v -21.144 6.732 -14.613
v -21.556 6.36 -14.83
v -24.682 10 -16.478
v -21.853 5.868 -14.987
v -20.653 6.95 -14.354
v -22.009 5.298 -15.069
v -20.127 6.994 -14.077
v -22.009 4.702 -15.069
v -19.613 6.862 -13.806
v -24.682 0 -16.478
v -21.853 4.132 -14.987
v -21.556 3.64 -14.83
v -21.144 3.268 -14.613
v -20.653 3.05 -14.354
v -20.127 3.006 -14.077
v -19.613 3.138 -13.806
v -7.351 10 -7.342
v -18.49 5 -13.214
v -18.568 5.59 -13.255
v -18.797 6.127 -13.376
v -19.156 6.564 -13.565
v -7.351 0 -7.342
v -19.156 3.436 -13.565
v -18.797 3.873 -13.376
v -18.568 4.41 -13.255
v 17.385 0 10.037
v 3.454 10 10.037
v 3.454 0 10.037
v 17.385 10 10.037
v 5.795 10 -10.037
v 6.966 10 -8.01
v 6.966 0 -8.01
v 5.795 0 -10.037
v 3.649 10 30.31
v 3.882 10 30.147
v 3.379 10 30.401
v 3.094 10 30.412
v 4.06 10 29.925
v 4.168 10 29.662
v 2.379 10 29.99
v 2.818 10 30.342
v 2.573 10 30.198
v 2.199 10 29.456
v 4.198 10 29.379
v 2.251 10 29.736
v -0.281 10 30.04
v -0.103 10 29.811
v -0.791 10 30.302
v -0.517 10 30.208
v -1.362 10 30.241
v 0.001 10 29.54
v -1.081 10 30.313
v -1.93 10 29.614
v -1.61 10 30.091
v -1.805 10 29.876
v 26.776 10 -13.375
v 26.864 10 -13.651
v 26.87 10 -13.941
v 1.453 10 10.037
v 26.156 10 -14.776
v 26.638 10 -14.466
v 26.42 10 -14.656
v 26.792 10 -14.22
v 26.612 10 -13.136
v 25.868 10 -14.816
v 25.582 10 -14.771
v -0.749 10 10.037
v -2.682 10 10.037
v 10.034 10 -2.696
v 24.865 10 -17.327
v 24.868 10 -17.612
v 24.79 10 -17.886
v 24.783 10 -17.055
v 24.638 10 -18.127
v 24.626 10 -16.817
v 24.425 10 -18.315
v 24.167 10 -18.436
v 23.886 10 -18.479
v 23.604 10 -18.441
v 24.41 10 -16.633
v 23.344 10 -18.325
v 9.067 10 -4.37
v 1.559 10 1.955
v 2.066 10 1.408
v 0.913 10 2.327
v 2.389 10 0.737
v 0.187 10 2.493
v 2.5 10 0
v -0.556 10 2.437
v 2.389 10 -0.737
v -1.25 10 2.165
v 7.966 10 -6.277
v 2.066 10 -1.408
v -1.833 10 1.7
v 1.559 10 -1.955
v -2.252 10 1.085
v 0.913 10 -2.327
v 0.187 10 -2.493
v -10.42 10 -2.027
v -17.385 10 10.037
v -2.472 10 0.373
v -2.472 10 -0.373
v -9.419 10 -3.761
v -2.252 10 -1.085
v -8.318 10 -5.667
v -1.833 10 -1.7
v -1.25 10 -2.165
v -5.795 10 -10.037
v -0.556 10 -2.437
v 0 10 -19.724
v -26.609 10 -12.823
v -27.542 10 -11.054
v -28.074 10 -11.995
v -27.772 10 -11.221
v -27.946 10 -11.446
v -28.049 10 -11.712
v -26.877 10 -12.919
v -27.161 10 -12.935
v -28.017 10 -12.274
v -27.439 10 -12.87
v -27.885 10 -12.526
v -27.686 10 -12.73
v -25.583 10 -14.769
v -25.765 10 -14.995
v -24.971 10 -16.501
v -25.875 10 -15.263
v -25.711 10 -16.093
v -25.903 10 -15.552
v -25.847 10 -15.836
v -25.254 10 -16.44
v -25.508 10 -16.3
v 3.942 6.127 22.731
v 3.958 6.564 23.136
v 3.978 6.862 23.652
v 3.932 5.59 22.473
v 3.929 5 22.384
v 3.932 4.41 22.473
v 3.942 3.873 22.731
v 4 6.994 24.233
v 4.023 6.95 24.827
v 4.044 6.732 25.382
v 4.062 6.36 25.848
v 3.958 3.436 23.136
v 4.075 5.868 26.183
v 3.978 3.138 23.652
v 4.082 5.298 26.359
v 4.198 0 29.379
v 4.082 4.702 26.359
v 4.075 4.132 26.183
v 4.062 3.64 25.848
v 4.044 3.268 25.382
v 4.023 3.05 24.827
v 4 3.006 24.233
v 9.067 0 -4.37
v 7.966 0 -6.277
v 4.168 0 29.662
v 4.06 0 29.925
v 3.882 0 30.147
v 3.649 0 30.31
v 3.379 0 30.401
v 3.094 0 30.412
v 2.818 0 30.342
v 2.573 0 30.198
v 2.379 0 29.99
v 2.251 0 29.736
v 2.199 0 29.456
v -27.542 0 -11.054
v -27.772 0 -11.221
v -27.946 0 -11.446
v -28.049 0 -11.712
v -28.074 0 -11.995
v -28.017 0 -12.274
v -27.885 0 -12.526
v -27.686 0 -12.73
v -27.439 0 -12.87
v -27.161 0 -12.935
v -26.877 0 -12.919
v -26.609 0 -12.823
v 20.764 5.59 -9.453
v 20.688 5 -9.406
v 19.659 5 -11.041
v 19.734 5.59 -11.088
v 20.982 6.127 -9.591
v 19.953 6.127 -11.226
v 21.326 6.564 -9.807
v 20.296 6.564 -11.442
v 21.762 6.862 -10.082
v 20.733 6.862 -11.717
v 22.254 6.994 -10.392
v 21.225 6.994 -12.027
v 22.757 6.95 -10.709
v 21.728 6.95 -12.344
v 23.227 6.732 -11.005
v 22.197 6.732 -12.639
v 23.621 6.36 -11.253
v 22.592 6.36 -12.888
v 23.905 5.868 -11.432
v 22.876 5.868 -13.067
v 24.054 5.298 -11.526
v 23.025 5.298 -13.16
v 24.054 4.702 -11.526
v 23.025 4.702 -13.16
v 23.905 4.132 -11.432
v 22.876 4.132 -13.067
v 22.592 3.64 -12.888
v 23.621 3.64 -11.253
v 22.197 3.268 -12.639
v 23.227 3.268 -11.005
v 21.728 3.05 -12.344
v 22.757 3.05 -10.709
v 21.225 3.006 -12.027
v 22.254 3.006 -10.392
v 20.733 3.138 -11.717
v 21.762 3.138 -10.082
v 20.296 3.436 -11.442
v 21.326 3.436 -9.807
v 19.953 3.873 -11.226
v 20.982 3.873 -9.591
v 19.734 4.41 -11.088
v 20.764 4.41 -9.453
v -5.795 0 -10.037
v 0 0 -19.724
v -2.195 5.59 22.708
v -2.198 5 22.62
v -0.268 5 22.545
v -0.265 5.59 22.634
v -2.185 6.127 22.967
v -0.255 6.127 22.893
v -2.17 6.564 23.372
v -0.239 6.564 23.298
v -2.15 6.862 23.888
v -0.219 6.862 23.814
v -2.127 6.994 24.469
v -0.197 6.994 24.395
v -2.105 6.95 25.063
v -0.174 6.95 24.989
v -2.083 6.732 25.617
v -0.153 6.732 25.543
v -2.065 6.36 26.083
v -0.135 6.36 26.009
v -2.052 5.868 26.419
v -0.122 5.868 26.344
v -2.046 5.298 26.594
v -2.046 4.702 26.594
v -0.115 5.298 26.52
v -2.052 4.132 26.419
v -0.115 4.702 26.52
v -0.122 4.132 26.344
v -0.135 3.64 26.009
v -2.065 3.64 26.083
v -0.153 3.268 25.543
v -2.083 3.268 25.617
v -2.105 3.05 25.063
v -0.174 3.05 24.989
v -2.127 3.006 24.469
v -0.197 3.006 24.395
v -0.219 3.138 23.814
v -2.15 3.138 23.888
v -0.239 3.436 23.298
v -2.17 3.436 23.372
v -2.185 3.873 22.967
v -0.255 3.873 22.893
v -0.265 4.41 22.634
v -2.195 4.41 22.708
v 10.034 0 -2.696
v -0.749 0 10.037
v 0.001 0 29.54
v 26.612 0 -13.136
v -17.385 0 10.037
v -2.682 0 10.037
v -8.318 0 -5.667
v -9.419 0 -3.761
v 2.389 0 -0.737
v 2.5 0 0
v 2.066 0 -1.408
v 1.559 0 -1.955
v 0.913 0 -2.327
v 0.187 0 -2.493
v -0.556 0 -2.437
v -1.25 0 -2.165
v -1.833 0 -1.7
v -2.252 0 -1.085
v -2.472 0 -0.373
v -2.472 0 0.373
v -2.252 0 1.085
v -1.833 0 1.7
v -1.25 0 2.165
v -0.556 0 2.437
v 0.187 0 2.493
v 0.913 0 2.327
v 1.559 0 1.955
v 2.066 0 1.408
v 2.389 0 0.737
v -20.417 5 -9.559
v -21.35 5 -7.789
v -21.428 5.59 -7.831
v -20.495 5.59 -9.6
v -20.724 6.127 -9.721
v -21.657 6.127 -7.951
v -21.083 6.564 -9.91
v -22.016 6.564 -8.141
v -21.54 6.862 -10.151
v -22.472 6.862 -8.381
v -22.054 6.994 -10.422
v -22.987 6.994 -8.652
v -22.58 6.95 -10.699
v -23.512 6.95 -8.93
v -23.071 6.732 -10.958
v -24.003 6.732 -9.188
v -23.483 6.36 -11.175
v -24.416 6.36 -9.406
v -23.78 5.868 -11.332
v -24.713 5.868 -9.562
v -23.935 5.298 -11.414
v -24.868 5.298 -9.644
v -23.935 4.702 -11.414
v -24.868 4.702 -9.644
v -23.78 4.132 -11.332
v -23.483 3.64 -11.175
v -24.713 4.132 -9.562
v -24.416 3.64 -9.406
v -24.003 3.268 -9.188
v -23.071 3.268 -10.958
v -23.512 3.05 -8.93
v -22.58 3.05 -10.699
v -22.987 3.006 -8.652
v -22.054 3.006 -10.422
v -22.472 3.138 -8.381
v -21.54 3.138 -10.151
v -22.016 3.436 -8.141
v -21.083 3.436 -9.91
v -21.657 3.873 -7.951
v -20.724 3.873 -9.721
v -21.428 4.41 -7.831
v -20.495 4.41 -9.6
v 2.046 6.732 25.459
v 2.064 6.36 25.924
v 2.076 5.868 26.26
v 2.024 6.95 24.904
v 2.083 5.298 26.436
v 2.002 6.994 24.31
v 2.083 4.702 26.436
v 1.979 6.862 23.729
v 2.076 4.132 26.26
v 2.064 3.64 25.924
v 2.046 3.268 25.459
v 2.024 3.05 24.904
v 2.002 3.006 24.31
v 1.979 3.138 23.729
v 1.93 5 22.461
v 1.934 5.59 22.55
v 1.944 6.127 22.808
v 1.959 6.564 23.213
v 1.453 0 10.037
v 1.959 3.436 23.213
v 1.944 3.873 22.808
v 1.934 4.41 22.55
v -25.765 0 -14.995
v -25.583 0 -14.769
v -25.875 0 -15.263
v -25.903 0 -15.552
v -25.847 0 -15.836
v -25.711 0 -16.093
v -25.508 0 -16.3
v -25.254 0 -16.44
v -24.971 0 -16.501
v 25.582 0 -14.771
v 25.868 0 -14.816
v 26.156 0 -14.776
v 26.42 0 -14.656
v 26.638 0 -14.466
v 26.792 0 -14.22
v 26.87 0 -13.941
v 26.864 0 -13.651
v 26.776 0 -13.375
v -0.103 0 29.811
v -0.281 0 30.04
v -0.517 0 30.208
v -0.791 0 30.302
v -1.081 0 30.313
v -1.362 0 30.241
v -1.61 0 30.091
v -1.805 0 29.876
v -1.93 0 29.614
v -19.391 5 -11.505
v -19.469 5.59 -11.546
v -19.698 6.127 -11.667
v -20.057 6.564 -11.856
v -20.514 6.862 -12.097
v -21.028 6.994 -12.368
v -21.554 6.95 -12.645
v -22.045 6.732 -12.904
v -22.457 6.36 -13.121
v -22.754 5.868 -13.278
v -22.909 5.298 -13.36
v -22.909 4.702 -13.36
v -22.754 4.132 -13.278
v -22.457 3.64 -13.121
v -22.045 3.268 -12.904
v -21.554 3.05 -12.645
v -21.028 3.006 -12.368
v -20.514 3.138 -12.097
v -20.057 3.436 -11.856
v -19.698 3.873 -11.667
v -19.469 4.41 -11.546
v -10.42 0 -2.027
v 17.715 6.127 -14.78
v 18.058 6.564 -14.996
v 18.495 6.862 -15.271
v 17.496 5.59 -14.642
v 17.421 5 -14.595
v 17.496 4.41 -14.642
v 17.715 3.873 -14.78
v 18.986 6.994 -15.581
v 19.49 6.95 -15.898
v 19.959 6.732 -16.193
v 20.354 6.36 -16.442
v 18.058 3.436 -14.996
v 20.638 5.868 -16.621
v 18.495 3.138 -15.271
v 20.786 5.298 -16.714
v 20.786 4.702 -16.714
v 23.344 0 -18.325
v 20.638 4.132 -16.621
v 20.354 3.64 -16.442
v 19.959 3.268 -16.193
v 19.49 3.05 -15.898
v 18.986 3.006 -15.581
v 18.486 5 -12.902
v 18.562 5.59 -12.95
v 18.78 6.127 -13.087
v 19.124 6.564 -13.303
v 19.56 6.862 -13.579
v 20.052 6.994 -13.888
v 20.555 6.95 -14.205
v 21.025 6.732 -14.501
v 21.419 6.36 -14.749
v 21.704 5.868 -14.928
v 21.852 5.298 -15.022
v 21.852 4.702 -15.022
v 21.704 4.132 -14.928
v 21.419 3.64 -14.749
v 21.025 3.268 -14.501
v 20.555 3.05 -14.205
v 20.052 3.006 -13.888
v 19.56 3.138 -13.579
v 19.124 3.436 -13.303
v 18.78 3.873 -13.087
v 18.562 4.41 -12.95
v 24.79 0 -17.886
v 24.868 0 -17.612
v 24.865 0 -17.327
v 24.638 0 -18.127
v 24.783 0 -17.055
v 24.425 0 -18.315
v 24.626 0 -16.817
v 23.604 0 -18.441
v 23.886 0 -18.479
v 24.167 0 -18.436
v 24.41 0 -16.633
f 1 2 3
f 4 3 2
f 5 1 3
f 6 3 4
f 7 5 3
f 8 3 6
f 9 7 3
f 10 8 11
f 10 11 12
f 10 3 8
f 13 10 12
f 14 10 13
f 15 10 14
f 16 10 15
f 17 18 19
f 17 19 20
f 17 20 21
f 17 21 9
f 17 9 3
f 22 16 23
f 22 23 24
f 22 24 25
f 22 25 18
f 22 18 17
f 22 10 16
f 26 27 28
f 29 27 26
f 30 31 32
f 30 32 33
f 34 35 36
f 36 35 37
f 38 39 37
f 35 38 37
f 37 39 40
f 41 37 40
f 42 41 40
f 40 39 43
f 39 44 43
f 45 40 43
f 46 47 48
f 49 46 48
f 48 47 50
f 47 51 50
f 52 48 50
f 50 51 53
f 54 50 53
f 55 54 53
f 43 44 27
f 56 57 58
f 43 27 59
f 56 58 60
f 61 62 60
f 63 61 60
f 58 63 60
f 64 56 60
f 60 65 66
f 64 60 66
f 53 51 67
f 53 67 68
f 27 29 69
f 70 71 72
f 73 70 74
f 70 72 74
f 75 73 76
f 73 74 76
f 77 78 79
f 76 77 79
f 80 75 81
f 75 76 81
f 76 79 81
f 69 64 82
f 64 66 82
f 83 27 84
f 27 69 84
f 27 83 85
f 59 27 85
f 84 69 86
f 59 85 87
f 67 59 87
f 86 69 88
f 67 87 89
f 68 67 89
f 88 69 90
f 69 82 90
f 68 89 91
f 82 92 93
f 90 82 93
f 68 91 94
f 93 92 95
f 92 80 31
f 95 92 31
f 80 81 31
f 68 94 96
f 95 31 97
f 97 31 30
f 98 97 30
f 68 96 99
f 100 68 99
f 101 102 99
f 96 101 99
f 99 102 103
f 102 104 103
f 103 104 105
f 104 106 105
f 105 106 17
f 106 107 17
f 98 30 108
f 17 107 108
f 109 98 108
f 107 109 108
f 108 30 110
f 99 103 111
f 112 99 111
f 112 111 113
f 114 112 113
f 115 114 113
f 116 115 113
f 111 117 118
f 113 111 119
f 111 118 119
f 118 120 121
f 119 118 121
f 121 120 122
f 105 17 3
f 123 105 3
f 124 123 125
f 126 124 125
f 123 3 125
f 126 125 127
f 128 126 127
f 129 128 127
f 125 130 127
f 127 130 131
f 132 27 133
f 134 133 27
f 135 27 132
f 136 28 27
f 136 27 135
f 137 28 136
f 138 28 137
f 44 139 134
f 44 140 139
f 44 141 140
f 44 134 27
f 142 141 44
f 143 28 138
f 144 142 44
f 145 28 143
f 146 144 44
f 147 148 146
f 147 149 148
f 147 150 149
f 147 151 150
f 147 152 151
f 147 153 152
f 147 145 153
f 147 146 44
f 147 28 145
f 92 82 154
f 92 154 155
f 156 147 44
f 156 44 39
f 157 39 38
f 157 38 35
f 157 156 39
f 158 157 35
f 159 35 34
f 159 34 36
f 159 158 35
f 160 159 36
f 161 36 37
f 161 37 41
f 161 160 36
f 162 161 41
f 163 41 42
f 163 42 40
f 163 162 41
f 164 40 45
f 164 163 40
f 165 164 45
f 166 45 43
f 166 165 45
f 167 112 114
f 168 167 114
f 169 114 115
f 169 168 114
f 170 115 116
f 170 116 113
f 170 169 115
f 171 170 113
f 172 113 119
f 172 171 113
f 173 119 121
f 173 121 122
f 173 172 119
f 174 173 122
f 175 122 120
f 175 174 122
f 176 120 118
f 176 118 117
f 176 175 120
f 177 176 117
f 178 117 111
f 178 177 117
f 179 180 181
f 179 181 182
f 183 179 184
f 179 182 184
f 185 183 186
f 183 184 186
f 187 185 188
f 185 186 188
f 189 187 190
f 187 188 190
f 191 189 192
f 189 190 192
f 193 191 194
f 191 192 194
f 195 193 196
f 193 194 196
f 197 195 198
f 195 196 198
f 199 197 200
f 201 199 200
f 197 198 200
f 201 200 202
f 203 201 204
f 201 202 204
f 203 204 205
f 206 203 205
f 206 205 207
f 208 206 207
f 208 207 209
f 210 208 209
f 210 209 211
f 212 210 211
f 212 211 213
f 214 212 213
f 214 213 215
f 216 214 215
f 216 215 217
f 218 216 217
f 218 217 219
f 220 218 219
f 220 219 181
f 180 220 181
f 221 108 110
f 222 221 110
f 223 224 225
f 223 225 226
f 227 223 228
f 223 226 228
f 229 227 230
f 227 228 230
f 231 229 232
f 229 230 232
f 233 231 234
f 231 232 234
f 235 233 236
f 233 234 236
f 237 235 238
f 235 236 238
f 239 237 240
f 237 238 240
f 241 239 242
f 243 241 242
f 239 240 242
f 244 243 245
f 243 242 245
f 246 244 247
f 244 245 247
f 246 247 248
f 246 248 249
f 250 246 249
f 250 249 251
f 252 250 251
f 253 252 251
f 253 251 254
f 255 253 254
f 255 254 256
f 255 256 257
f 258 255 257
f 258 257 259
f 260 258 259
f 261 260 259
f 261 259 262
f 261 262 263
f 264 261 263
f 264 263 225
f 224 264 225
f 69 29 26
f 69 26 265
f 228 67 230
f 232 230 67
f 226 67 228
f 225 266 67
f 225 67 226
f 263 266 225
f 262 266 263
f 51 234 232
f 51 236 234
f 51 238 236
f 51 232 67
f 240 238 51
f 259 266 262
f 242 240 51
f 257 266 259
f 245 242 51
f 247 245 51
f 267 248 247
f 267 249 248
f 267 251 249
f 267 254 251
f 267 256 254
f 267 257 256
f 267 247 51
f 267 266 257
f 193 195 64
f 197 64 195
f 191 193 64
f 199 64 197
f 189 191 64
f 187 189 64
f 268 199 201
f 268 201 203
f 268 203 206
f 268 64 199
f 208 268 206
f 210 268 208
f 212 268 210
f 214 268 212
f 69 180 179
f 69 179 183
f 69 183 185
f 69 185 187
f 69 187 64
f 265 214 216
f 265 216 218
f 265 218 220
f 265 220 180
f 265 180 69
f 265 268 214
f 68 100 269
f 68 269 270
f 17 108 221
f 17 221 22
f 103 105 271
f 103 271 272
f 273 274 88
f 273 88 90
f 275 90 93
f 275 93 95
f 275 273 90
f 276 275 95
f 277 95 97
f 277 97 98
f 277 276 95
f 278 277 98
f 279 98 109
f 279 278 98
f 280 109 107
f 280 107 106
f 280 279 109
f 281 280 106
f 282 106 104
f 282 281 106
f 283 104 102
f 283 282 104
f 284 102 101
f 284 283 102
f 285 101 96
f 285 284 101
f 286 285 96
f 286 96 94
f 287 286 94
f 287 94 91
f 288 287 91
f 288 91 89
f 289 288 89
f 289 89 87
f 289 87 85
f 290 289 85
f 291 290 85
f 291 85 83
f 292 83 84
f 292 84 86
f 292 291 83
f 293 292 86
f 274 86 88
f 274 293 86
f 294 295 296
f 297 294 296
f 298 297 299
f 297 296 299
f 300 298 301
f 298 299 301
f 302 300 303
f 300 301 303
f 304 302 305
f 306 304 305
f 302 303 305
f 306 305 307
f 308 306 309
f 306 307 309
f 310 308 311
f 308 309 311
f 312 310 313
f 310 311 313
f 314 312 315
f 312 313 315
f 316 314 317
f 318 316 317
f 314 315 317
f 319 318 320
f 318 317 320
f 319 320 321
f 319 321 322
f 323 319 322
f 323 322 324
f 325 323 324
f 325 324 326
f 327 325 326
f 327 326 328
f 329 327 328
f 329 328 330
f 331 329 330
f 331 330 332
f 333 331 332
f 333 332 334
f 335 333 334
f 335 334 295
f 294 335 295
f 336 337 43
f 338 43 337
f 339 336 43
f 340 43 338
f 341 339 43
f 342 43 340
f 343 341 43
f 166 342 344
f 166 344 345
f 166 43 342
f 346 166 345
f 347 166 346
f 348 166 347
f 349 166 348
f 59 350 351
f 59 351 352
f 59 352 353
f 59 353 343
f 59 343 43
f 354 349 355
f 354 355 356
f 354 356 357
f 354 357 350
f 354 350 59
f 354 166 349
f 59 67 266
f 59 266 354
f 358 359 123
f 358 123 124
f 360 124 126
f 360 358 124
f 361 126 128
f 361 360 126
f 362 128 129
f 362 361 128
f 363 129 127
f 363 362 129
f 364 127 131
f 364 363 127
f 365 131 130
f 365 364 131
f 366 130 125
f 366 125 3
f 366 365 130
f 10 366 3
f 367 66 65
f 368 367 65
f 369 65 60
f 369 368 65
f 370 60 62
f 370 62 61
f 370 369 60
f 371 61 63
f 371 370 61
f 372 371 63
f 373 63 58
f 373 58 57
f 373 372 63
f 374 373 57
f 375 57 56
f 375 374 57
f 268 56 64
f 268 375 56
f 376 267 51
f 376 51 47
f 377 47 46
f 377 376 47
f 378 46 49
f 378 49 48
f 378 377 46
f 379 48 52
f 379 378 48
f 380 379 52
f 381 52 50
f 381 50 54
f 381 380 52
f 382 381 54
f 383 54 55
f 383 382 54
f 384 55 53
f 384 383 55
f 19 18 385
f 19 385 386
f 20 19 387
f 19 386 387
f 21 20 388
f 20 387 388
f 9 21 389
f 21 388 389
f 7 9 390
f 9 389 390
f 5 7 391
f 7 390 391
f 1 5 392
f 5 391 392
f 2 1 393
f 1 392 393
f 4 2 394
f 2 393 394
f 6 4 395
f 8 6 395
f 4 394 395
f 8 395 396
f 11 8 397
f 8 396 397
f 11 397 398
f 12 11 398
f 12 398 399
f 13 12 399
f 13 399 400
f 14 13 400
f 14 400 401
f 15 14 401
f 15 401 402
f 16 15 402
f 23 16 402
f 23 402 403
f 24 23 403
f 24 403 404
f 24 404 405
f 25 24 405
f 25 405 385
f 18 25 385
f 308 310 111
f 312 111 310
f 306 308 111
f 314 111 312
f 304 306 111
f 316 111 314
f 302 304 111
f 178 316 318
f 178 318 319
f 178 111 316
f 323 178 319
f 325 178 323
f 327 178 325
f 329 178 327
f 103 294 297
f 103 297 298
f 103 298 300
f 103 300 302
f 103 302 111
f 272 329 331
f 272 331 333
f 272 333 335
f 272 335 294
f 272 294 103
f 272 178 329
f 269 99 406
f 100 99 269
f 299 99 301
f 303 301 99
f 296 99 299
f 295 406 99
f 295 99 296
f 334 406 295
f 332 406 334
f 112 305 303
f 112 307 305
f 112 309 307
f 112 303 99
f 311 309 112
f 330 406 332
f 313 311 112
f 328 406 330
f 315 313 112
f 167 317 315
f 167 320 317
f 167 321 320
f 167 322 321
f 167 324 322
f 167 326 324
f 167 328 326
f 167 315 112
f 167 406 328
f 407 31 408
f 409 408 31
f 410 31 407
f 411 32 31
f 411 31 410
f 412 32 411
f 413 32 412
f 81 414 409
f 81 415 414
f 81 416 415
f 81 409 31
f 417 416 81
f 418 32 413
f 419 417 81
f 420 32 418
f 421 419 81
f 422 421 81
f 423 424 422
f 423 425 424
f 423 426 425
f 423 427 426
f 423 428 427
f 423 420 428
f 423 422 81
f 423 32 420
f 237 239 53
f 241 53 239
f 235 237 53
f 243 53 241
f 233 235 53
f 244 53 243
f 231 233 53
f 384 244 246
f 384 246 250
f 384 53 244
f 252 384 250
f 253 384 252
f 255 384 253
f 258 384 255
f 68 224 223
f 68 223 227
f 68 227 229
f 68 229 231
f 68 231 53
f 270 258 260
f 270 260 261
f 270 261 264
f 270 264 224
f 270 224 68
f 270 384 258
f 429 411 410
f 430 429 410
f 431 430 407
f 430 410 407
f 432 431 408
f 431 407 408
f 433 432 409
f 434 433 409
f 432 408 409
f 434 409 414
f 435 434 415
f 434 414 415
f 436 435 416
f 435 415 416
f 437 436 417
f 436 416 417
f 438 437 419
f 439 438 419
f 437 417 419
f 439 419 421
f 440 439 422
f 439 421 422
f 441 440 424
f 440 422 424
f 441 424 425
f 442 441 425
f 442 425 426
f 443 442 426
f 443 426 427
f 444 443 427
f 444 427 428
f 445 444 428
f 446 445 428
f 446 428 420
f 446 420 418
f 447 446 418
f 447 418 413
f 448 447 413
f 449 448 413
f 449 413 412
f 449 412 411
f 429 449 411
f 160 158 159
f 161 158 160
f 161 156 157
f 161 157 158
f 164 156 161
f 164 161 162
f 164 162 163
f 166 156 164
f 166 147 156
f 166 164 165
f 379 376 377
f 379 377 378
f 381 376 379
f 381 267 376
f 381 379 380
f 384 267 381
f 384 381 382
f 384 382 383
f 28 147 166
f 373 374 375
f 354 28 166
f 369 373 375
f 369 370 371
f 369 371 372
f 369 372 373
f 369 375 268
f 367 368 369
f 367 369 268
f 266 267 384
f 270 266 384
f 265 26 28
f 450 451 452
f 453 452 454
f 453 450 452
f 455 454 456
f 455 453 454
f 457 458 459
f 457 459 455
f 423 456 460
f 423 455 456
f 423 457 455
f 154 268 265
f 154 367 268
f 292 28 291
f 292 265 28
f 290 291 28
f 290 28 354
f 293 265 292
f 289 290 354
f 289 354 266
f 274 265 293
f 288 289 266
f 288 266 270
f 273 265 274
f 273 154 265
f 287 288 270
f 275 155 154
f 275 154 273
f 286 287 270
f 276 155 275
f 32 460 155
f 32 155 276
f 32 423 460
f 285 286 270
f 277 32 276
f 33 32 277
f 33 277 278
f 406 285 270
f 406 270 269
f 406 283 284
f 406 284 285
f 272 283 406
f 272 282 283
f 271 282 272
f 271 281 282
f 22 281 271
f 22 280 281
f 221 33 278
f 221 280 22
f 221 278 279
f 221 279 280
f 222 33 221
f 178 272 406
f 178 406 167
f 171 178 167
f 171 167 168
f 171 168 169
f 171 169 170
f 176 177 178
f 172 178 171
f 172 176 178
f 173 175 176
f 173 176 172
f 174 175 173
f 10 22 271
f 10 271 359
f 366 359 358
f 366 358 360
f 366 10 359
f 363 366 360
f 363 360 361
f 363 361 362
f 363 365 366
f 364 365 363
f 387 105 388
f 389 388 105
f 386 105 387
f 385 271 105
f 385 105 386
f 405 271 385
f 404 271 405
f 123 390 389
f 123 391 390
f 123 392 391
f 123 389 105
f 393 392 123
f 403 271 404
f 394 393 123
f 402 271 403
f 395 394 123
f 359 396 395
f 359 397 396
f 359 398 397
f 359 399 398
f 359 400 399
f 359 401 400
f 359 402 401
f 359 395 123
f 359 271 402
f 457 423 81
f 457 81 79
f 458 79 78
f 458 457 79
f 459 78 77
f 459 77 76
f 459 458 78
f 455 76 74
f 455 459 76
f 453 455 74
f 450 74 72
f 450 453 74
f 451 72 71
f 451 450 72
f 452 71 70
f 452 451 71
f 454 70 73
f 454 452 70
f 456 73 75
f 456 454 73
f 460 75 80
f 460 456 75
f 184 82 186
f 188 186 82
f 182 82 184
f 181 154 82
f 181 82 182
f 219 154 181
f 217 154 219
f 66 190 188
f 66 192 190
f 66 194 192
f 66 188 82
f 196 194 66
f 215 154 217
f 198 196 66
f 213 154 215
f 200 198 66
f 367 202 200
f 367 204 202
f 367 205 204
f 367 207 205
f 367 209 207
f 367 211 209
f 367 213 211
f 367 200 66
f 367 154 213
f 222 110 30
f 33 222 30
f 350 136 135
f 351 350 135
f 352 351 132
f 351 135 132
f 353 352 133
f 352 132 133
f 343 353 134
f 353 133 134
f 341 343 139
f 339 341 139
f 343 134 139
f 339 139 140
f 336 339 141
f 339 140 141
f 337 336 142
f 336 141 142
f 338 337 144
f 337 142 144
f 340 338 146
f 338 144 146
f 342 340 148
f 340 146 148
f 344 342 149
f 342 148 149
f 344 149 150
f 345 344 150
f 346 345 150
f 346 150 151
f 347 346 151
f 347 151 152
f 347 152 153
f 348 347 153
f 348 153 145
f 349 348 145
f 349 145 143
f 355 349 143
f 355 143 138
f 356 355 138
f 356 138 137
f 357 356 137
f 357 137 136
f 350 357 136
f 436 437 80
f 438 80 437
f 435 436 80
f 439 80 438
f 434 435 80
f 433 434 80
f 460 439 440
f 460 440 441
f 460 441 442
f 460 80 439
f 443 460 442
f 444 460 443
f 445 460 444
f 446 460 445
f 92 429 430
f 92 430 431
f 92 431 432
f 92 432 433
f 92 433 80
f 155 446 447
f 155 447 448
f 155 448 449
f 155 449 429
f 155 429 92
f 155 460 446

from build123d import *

# Parameters (mm, degrees)
SKETCH1_R           = 2.5
BOSS_EXTRUDE1_DEPTH = 10
SKETCH2_R           = 2
CUT_EXTRUDE1_DEPTH  = 10
CIRPATTERN1_COUNT   = 3
SKETCH3_R           = 2.5
BOSS_EXTRUDE3_DEPTH = 10
SKETCH4_R           = 2.500796224
BOSS_EXTRUDE4_DEPTH = 10


with BuildPart() as part:
    # Sketch1 → Boss-Extrude1 (new body)
    with BuildSketch(Plane(origin=(0, 0, 0), x_dir=(1, 0, 0), z_dir=(0, 1, 0))):
        with BuildLine():
            Line((3.42943918, -9.393558799), (4.197898245, -29.378790113))
            ThreePointArc((4.197898245, -29.378790113), (3.237059632, -30.416474632), (2.199375114, -29.455636019))
            Line((2.199375114, -29.455636019), (1.447231615, -9.894721858))
            ThreePointArc((1.447231615, -9.894721858), (0.350023332, -9.993872306), (-0.751433173, -9.971727442))
            Line((-0.751433173, -9.971727442), (0.000999669, -29.540166516))
            ThreePointArc((0.000999669, -29.540166516), (-0.935779597, -30.318112399), (-1.929530696, -29.614398009))
            Line((-1.929530696, -29.614398009), (-2.697989761, -9.629166695))
            ThreePointArc((-2.697989761, -9.629166695), (-8.461744243, -5.329060364), (-9.849780142, 1.726797949))
            Line((-9.849780142, 1.726797949), (-27.541727692, 11.053908534))
            ThreePointArc((-27.541727692, 11.053908534), (-27.959969541, 12.404861441), (-26.609016634, 12.823103289))
            Line((-26.609016634, 12.823103289), (-9.2926963, 3.694021585))
            ThreePointArc((-9.2926963, 3.694021585), (-8.829958965, 4.693807055), (-8.260052699, 5.636623938))
            Line((-8.260052699, 5.636623938), (-25.58303447, 14.769217519))
            ThreePointArc((-25.58303447, 14.769217519), (-25.788365734, 15.969465103), (-24.682055646, 16.478221605))
            Line((-24.682055646, 16.478221605), (-6.990108095, 7.15111102))
            ThreePointArc((-6.990108095, 7.15111102), (-0.384229532, 9.992615657), (6.420340962, 7.66676085))
            Line((6.420340962, 7.66676085), (23.343829448, 18.324881579))
            ThreePointArc((23.343829448, 18.324881579), (24.722909908, 18.011613191), (24.40964152, 16.63253273))
            Line((24.40964152, 16.63253273), (7.845464685, 6.200700273))
            ThreePointArc((7.845464685, 6.200700273), (8.479935633, 5.300065251), (9.011485871, 4.335103505))
            Line((9.011485871, 4.335103505), (25.582034801, 14.770948997))
            ThreePointArc((25.582034801, 14.770948997), (26.724145331, 14.348647296), (26.611586342, 13.136176404))
            Line((26.611586342, 13.136176404), (9.688097856, 2.478055676))
            ThreePointArc((9.688097856, 2.478055676), (8.845973775, -4.663555293), (3.42943918, -9.393558799))
        make_face()
        Circle(SKETCH1_R, mode=Mode.SUBTRACT)
    extrude(amount=BOSS_EXTRUDE1_DEPTH)

    # Sketch2 → Cut-Extrude1 (cut)
    with BuildSketch(Plane(origin=(3.063714471, 0, -0.117803948), x_dir=(-0.038422953, 0, -0.999261566), z_dir=(0.999261566, 0, -0.038422953))):
        with Locations((-24.518391454, 5)):
            Circle(SKETCH2_R)
    cut_extrude1 = extrude(amount=-CUT_EXTRUDE1_DEPTH, mode=Mode.SUBTRACT)

    # CirPattern1: Cut-Extrude1 ×3 about axis
    cirpattern1_axis = Axis((0, 10, 0), (0, -1, 0))
    for i in range(1, CIRPATTERN1_COUNT):
        add(cut_extrude1.rotate(cirpattern1_axis, i * 360 / CIRPATTERN1_COUNT), mode=Mode.SUBTRACT)

    # Sketch3 → Boss-Extrude3 (add)
    with BuildSketch(Plane(origin=(0, 10, 0), x_dir=(1, 0, 0), z_dir=(0, 1, 0))):
        Polygon((11.5901527, 0), (5.79507635, 10.037366672), (-5.79507635, 10.037366672), (-11.5901527, 0), (-5.79507635, -10.037366672), (5.79507635, -10.037366672), align=None)
        Circle(SKETCH3_R, mode=Mode.SUBTRACT)
    extrude(amount=-BOSS_EXTRUDE3_DEPTH)

    # Sketch4 → Boss-Extrude4 (add)
    with BuildSketch(Plane(origin=(0, 10, 0), x_dir=(1, 0, 0), z_dir=(0, 1, 0))):
        Polygon((-5.79507635, 10.037366672), (0, 19.724396452), (5.79507635, 10.037366672), (11.5901527, 0), (17.38522905, -10.037366672), (5.79507635, -10.037366672), (-5.79507635, -10.037366672), (-17.38522905, -10.037366672), (-11.5901527, 0), align=None)
        Circle(SKETCH4_R, mode=Mode.SUBTRACT)
    extrude(amount=-BOSS_EXTRUDE4_DEPTH)


solid = part.part
